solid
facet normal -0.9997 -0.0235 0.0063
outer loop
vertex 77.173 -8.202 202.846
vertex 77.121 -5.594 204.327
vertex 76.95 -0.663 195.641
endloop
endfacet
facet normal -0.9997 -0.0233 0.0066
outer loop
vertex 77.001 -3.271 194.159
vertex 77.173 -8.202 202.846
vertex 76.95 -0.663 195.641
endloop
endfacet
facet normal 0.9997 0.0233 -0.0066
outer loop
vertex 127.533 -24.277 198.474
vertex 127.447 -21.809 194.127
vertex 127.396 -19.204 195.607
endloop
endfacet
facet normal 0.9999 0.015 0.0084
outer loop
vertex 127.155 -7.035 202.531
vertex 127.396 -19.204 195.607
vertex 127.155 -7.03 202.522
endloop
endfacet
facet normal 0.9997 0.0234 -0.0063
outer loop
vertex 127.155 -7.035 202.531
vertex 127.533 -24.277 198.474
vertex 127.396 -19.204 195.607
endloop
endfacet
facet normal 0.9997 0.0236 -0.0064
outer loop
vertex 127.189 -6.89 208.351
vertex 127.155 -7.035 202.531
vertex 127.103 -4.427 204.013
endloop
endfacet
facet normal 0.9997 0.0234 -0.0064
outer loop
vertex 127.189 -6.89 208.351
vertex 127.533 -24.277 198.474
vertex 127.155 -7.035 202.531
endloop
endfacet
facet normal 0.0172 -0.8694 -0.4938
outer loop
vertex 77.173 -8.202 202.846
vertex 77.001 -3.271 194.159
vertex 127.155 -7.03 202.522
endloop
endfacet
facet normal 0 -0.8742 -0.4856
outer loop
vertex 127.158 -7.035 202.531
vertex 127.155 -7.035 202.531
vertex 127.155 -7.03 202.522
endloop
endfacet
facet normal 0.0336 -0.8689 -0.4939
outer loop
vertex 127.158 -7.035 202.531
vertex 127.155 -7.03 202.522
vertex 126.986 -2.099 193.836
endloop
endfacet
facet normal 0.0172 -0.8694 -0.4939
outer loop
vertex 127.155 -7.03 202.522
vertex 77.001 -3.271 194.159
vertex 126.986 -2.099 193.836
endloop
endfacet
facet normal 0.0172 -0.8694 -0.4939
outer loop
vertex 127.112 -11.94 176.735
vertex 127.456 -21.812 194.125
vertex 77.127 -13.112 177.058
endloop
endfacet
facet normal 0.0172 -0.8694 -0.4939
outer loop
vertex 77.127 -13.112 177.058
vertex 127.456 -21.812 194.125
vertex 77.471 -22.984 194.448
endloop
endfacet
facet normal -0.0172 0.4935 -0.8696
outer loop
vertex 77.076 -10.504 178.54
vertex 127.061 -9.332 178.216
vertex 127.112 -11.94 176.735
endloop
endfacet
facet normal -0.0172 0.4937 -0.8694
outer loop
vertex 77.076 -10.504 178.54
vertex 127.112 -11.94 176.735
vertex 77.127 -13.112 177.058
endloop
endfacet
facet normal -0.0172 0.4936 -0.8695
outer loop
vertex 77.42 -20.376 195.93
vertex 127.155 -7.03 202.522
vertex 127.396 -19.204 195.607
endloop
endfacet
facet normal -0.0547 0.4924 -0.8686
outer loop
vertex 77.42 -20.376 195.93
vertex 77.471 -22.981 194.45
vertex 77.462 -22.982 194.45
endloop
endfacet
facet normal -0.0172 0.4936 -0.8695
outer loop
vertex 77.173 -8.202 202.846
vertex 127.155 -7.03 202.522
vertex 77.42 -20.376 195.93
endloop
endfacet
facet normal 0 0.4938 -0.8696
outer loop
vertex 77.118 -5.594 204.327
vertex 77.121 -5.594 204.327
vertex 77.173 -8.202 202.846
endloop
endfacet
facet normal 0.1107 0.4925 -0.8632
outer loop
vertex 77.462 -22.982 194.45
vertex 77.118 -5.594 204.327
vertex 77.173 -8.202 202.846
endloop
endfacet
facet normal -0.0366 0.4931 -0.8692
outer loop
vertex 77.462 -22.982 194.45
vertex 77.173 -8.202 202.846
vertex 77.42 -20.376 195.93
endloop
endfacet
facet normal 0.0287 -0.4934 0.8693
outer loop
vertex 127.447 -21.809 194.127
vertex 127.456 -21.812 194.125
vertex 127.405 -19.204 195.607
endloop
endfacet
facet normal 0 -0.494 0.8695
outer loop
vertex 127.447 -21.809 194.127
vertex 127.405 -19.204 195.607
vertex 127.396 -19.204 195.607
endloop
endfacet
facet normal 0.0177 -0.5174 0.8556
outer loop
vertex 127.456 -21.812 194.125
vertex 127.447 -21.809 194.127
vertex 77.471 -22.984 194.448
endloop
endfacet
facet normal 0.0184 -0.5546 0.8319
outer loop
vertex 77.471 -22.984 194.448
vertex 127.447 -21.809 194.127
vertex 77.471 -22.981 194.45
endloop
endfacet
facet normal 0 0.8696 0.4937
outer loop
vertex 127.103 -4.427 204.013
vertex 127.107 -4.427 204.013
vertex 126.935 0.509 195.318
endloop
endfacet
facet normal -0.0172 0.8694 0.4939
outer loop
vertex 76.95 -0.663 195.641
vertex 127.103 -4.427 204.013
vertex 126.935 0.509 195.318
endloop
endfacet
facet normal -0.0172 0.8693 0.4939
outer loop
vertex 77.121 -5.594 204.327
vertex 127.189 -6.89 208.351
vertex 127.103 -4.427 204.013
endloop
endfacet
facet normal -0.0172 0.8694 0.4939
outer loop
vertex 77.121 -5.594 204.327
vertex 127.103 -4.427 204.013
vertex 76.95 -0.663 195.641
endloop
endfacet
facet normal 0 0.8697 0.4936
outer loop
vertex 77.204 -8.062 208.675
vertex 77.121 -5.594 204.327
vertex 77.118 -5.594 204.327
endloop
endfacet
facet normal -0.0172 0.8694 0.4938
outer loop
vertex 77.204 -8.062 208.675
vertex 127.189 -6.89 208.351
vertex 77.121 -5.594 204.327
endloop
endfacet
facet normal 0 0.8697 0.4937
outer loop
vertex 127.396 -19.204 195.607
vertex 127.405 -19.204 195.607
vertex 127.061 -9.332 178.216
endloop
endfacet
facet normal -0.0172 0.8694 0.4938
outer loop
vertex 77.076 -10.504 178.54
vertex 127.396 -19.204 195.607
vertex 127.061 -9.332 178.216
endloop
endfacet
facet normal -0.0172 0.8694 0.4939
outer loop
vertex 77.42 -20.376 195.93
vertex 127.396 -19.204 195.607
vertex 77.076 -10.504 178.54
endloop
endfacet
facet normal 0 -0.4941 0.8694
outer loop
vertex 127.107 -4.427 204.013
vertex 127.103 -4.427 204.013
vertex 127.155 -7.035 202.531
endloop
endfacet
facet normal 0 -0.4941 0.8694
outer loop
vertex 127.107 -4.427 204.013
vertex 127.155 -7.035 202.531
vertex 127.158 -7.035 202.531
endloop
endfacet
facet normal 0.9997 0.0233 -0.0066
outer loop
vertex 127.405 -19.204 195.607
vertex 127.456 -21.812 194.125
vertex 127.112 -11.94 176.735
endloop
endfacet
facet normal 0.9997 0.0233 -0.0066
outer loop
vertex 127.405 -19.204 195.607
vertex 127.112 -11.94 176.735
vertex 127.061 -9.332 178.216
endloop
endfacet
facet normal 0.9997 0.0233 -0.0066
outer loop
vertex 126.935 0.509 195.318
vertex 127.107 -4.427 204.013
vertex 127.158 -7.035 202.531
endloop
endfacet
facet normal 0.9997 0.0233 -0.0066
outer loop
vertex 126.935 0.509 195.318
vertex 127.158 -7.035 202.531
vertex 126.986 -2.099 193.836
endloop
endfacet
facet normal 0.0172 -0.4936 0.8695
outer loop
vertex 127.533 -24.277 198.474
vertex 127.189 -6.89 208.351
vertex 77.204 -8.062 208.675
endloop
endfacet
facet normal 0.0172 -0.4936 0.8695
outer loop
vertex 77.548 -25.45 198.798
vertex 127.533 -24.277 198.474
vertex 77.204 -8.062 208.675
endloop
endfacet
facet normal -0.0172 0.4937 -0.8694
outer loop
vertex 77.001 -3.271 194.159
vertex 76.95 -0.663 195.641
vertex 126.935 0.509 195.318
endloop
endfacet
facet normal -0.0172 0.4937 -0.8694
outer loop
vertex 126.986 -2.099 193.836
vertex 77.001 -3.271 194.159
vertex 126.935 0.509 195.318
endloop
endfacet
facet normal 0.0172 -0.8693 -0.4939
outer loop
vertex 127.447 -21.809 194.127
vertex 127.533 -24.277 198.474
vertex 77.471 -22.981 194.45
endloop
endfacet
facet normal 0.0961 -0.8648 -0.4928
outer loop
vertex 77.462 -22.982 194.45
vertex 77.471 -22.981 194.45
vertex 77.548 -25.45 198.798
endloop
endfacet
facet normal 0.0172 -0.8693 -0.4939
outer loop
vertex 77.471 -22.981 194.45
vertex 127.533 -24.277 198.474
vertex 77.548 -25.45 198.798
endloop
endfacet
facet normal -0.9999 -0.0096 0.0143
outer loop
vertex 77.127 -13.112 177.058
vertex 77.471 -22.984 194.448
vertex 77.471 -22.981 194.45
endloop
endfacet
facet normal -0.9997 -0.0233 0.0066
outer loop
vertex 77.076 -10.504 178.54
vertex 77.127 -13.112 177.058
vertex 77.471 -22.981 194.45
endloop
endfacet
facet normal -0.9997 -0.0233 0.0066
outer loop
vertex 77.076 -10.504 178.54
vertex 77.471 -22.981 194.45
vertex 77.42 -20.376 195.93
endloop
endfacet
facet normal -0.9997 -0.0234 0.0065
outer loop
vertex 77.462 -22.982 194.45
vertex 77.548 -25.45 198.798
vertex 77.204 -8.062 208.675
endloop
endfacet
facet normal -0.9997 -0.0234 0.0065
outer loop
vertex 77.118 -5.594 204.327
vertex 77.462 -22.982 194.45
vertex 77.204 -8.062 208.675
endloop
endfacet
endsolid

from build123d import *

# Parameters (mm, degrees)
SKETCH054_W             = 50
SKETCH054_H             = 20
PAD053_DEPTH            = 5
SKETCH055_W             = 50
SKETCH055_H             = 3
PAD054_DEPTH            = 20
SKETCH056_W             = 50
SKETCH056_H             = 10
PAD055_DEPTH            = 3
BODY042_ROLL_ANGLE      = 150.405023
BODY042_PITCH_ANGLE     = -0.370429
BODY042_PLACEMENT_ANGLE = -178.656588


with BuildPart() as part:
    # Sketch054 → Pad053 (new body)
    with BuildSketch(Plane.XY):
        with Locations((184.845276, -123.914059)):
            Rectangle(SKETCH054_W, SKETCH054_H)
    extrude(amount=PAD053_DEPTH)

    # Sketch055 (on Face6 of Pad053) → Pad054 (join)
    with BuildSketch(Plane.XY.offset(5)):
        with Locations((184.83606, -132.417099)):
            Rectangle(SKETCH055_W, SKETCH055_H)
    extrude(amount=PAD054_DEPTH)

    # Sketch056 (on Face7 of Pad054) → Pad055 (join)
    with BuildSketch(Plane(origin=(0, -113.914059, 0), x_dir=(-1, 0, 0), z_dir=(0, 1, 0))):
        with Locations((-184.841869, 9.989668)):
            Rectangle(SKETCH056_W, SKETCH056_H)
    extrude(amount=-PAD055_DEPTH)


with BuildPart() as part_1:
    # Body042 roll: moved
    add(part.part.rotate(Axis((0, 0, 0), (1, 0, 0)), BODY042_ROLL_ANGLE))


with BuildPart() as part_2:
    # Body042 pitch: moved
    add(part_1.part.rotate(Axis((0, 0, 0), (0, 1, 0)), BODY042_PITCH_ANGLE))


with BuildPart() as part_3:
    # Body042 placement: moved
    add(part_2.part.moved(Location((285.028603, 95.891543, 263.575076))).rotate(Axis((285.028603, 95.891543, 263.575076), (0, 0, 1)), BODY042_PLACEMENT_ANGLE))


solid = part_3.part
